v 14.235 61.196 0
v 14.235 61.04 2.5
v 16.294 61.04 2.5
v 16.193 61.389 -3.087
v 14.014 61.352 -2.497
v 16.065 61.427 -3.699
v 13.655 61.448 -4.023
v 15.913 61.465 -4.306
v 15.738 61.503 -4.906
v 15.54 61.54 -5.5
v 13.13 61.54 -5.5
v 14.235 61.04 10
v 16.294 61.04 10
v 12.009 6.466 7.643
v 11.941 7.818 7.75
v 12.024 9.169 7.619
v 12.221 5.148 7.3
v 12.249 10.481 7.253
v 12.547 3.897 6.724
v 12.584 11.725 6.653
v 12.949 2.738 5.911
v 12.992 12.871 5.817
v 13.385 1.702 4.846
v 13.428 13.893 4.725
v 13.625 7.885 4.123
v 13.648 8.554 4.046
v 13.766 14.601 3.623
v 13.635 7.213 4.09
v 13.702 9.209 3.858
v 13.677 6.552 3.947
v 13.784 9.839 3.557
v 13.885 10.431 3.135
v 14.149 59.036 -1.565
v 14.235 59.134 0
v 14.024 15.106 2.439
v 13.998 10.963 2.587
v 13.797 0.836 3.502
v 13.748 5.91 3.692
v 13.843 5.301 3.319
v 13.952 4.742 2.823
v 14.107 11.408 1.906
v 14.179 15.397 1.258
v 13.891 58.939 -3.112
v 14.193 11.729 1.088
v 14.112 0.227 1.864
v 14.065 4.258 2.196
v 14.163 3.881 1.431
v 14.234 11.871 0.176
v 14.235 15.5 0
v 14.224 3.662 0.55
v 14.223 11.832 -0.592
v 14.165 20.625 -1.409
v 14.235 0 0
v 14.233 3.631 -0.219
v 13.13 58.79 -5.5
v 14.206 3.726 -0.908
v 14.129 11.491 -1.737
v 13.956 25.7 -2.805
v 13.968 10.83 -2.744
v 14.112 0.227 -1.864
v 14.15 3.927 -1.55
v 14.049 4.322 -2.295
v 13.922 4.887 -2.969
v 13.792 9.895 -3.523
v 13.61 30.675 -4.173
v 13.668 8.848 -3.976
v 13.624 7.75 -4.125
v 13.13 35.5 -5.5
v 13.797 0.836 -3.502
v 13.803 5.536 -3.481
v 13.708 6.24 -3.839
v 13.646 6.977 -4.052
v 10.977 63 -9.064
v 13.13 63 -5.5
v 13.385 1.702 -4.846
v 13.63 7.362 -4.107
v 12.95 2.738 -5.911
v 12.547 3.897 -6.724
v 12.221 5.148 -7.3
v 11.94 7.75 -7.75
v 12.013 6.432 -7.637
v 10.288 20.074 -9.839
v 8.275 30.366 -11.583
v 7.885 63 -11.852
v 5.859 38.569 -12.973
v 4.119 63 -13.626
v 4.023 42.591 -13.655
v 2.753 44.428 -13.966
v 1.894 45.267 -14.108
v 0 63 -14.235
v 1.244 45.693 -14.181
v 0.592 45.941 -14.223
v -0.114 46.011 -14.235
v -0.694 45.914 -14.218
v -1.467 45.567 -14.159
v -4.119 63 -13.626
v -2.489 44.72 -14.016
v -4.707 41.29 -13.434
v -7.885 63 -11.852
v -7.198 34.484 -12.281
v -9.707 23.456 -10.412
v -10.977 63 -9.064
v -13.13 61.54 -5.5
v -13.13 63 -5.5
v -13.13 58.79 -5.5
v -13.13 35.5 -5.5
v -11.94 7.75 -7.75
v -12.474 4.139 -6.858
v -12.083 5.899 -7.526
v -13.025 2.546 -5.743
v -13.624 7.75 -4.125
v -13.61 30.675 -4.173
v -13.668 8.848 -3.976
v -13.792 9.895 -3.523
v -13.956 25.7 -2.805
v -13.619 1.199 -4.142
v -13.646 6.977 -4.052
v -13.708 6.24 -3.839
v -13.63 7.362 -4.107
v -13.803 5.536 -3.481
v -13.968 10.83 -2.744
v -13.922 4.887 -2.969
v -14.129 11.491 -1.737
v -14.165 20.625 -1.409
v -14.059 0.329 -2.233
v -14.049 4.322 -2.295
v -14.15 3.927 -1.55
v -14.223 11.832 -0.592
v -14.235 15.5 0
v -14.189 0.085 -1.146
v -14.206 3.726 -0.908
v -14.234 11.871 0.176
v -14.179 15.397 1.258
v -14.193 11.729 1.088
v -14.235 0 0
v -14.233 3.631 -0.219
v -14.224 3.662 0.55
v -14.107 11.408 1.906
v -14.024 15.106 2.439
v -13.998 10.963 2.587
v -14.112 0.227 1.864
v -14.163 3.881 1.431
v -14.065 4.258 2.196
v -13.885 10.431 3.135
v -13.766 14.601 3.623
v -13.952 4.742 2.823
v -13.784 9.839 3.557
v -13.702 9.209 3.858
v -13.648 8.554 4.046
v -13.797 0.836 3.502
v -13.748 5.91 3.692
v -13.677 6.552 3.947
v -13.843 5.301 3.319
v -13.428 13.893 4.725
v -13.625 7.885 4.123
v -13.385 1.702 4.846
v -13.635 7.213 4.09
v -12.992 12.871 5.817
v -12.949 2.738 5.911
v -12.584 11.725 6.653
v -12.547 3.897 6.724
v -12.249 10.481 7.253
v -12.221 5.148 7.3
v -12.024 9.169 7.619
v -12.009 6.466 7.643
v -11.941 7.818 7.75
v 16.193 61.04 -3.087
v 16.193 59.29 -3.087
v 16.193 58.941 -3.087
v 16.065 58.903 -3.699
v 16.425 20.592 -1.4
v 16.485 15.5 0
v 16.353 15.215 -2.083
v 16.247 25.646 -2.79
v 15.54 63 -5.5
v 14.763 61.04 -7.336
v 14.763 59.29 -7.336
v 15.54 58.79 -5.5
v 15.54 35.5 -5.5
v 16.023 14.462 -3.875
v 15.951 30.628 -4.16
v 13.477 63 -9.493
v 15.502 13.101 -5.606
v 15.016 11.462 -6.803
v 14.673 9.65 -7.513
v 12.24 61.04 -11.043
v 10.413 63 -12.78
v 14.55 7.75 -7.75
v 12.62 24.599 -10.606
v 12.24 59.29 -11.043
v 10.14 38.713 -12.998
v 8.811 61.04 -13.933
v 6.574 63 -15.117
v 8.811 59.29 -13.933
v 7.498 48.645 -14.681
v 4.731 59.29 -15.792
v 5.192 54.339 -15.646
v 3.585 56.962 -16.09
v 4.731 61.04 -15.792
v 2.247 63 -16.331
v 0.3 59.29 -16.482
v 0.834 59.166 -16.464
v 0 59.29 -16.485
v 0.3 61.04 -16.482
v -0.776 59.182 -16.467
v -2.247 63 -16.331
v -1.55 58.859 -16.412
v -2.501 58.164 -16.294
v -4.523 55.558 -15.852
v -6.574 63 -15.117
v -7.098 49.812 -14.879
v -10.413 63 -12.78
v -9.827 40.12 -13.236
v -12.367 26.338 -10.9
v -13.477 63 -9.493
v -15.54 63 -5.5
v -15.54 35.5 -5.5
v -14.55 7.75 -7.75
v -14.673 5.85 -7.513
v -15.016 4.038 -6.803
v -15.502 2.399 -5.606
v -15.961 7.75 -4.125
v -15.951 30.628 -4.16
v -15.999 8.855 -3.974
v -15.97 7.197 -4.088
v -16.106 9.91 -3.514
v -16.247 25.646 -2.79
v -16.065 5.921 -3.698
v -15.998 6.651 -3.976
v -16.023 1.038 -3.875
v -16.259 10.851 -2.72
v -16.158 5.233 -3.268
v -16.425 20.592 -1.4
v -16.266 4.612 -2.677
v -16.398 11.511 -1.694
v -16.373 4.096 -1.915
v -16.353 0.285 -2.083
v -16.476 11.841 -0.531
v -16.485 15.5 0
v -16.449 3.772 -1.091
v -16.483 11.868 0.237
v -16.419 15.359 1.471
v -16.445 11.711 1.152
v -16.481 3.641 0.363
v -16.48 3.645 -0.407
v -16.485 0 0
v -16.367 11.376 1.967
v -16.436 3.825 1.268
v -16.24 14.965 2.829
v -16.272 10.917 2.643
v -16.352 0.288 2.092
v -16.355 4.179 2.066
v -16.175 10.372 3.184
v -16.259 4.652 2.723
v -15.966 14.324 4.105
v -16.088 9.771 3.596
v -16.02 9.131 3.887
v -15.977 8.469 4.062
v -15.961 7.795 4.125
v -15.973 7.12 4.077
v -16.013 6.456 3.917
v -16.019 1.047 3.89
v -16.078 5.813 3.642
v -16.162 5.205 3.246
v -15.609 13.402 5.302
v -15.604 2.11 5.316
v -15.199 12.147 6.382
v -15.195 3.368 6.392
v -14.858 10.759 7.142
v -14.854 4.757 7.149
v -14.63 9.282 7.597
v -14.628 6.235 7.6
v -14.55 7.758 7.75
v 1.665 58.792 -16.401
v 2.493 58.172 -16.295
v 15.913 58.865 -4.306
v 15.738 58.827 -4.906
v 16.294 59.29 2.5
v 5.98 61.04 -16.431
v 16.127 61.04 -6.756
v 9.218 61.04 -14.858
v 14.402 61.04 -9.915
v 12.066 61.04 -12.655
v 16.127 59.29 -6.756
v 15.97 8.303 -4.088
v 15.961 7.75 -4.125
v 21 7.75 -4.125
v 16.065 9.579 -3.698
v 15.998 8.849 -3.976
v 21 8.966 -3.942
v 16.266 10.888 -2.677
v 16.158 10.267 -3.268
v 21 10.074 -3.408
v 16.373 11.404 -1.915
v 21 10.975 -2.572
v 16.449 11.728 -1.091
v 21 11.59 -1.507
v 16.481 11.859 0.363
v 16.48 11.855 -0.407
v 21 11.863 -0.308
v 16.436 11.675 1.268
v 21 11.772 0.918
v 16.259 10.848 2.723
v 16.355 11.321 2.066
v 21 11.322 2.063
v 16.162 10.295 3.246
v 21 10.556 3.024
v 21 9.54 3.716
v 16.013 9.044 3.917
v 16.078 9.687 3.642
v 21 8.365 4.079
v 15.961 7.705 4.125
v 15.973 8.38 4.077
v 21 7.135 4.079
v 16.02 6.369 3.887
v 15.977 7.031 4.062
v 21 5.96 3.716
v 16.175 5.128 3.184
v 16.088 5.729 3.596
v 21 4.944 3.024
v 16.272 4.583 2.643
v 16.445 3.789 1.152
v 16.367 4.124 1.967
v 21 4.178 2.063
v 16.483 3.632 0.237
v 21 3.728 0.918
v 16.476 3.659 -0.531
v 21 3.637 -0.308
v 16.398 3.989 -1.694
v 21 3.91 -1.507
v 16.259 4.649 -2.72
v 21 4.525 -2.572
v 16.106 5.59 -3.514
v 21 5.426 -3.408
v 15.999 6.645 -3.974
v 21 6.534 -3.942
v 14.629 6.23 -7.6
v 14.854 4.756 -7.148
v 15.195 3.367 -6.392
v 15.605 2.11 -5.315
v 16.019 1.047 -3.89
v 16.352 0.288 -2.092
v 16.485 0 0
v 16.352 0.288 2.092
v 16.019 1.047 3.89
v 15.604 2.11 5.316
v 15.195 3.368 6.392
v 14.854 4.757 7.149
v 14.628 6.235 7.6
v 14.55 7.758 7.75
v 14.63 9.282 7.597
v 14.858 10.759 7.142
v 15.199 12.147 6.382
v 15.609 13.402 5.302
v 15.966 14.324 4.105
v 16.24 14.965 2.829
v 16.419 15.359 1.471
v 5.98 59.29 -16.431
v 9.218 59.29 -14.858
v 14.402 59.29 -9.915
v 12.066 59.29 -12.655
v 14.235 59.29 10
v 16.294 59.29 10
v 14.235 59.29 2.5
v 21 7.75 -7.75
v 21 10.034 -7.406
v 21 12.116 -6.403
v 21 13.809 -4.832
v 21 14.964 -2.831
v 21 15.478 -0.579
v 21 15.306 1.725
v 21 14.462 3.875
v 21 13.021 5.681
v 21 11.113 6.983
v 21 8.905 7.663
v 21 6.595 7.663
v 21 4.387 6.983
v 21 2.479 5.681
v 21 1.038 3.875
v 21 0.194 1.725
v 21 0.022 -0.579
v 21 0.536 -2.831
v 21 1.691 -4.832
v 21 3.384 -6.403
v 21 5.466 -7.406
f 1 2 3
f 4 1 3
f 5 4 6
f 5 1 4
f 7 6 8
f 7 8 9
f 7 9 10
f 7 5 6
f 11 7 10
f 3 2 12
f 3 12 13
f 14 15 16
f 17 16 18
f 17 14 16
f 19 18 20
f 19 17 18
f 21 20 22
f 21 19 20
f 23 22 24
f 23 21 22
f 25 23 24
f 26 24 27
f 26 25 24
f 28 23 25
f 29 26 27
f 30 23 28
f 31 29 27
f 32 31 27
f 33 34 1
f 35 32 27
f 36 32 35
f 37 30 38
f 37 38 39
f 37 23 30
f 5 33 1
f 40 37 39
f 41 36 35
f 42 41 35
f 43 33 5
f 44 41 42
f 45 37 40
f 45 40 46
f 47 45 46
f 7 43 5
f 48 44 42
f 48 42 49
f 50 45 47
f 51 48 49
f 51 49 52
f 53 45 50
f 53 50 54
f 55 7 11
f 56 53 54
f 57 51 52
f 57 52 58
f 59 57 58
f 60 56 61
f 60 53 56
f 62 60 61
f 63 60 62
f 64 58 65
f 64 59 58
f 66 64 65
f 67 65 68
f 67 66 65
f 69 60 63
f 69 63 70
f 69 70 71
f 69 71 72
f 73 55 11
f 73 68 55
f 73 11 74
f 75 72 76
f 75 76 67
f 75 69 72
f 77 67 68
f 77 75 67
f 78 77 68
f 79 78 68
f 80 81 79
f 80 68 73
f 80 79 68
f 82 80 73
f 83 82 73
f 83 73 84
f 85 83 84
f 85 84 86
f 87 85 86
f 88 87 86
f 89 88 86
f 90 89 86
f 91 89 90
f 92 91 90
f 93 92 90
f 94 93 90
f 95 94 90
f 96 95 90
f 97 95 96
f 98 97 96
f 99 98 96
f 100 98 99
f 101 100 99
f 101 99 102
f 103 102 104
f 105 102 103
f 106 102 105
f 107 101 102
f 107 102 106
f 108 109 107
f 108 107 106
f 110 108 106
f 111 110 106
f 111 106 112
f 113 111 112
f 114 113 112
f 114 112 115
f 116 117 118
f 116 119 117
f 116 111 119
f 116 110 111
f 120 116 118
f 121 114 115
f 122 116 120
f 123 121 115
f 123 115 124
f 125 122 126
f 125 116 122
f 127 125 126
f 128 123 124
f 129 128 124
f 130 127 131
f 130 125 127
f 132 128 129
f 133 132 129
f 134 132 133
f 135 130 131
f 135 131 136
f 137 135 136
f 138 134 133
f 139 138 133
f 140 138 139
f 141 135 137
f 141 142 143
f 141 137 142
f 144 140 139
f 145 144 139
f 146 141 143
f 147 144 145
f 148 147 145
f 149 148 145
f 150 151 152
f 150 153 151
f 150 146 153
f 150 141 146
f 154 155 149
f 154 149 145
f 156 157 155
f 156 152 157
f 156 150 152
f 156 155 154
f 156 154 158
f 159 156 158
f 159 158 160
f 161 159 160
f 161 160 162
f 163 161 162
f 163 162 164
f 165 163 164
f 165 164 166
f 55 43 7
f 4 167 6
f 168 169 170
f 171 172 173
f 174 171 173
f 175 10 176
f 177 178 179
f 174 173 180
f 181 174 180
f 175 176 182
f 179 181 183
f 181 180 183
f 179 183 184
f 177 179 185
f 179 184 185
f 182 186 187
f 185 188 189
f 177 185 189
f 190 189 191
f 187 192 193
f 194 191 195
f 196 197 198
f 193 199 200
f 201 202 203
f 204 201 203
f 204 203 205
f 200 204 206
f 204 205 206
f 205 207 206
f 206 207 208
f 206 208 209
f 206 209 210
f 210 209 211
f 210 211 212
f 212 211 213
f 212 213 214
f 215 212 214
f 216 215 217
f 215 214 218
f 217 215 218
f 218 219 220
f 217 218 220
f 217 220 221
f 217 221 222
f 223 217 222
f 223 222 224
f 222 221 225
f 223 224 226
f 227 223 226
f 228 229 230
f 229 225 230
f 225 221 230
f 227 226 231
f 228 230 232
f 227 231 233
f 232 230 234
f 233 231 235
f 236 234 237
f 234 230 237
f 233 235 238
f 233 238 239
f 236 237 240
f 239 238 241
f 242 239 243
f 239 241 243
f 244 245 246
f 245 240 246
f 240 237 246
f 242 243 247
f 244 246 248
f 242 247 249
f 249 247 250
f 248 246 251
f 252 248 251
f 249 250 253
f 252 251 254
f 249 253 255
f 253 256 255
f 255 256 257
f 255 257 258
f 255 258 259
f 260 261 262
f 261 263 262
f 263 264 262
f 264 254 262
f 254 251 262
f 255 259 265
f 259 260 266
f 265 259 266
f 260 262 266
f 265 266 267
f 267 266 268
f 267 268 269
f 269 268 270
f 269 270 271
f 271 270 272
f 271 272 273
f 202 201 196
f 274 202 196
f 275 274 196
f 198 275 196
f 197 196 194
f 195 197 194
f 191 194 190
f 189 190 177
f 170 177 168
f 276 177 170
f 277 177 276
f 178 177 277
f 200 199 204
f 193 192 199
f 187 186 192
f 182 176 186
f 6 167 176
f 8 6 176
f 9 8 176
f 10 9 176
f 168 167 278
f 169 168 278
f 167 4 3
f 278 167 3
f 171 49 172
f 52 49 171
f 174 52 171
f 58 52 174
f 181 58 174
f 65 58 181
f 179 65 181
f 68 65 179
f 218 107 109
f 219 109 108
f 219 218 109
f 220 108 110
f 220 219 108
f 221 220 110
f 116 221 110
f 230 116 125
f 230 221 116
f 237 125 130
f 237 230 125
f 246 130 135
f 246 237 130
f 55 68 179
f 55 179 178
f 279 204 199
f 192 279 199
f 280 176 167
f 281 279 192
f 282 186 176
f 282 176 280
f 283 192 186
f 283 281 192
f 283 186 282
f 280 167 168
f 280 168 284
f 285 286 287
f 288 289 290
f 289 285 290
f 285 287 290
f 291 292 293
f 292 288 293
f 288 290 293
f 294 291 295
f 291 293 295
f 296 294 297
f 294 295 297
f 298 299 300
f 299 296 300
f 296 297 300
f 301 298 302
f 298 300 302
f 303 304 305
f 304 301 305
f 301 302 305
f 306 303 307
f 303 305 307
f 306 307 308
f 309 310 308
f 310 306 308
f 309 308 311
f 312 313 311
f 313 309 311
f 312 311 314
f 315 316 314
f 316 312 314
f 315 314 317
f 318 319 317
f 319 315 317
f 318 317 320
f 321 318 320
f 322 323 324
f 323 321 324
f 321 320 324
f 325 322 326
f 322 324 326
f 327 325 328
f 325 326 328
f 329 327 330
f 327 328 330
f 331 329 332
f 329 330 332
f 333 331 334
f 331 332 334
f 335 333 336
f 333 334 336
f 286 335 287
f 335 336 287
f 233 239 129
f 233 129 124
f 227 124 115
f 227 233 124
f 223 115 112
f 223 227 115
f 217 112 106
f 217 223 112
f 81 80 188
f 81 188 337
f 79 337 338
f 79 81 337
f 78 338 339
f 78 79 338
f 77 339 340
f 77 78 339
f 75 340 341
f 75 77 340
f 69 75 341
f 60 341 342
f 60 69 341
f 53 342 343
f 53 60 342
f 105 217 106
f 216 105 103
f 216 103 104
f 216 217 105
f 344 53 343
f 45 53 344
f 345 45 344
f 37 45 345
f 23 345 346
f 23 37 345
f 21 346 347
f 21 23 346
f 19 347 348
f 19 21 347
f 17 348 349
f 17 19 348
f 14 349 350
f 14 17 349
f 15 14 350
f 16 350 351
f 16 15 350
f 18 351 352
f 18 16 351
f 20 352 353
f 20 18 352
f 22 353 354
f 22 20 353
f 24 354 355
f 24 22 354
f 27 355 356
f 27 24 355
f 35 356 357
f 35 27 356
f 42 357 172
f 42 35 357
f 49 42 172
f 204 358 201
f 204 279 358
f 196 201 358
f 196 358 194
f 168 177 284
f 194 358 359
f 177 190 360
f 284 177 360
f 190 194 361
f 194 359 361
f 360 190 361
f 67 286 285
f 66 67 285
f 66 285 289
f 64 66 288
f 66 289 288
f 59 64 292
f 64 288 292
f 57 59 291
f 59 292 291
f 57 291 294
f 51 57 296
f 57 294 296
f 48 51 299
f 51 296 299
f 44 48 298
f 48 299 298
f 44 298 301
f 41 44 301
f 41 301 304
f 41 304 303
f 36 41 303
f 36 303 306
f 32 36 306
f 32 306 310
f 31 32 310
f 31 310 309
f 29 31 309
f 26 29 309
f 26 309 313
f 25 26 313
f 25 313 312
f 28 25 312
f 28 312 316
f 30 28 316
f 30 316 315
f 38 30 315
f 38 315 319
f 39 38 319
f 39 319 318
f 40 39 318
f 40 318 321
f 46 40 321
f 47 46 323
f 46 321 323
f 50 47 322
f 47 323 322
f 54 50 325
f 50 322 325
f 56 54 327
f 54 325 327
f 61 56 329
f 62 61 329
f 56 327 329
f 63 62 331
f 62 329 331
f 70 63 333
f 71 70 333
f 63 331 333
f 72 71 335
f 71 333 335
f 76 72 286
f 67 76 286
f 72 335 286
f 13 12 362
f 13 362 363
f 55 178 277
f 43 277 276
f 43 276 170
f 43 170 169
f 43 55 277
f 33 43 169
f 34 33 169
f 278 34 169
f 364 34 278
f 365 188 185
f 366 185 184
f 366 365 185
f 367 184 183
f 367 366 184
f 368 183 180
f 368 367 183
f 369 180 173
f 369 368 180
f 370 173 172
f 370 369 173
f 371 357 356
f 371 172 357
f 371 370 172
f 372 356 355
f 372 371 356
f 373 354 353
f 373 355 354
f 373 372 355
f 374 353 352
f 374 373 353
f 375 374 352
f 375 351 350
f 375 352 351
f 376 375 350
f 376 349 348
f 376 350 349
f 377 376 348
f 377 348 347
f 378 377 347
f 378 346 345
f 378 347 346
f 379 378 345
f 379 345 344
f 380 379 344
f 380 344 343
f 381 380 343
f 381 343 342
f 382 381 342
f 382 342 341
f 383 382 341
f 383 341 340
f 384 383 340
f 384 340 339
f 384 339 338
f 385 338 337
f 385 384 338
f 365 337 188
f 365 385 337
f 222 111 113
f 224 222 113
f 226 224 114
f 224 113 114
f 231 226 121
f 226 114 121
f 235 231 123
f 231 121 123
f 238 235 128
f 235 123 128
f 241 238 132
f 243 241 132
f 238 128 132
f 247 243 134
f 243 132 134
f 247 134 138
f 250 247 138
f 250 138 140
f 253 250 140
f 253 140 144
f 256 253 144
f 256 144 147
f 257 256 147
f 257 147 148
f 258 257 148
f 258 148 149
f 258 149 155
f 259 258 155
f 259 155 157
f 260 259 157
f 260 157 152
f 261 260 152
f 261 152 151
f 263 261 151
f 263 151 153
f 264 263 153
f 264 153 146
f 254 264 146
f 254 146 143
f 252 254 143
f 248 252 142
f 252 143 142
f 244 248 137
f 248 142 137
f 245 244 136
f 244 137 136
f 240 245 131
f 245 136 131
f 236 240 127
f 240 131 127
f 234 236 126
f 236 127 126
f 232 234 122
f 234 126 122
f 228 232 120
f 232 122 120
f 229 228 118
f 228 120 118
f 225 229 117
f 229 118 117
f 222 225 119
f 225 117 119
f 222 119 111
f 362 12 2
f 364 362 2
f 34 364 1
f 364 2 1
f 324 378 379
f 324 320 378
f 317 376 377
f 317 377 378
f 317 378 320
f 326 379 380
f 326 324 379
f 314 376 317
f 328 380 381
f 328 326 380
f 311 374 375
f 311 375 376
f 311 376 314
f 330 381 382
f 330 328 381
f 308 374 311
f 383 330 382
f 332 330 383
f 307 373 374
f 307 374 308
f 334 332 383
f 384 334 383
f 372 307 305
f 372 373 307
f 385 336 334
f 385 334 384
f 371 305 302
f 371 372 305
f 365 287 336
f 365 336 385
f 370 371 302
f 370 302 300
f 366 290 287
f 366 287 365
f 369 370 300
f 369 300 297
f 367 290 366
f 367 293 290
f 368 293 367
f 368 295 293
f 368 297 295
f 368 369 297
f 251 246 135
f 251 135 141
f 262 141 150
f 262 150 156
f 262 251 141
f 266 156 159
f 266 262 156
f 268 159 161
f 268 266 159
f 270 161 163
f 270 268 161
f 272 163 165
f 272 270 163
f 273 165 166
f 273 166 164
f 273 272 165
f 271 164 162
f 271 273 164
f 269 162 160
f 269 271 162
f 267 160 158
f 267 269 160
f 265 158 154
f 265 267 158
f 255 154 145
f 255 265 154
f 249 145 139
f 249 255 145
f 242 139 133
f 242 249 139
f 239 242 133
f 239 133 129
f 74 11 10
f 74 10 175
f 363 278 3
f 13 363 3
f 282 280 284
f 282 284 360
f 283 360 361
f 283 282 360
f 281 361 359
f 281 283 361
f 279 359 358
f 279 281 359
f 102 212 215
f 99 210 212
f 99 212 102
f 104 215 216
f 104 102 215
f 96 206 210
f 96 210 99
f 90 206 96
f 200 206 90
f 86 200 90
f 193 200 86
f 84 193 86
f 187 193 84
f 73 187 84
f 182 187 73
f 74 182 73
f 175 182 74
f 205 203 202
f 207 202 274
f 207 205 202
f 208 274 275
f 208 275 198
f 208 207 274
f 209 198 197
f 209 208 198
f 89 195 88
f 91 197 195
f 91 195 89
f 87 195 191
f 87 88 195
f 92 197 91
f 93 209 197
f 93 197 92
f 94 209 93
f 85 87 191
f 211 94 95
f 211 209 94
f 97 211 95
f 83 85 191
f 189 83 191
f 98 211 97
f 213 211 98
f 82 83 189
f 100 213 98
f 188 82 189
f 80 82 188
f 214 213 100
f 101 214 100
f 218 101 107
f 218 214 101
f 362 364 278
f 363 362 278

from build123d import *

# Parameters (mm, degrees)
SKETCH1_R               = 16.485
SKETCH1_R_2             = 14.235
BOSS_EXTRUDE1_DEPTH     = 63
SKETCH2_R               = 4.125
CUT_EXTRUDE1_DEPTH      = 73.991616813
CUT_EXTRUDE2_START      = -32.970000348
CUT_EXTRUDE2_DEPTH      = 32.970000348
CUT_EXTRUDE4_DEPTH      = 68.175222223
CUT_EXTRUDE4_DEPTH_BACK = 15
BOSS_EXTRUDE2_DEPTH     = 0.875
SKETCH9_W               = 2.280579787
SKETCH9_H               = 1.75
BOSS_EXTRUDE4_DEPTH     = 7.5
SKETCH10_W              = 0.221248718
SKETCH10_H              = 10
CUT_EXTRUDE5_DEPTH      = 2.5
BOSS_EXTRUDE5_REACH     = 77.139
SKETCH11_R              = 7.75
SKETCH11_R_2            = 4.125
CUT_EXTRUDE7_DEPTH      = 10


# Read off the part's stored shape, not the designer's step: Cut-Extrude2
with BuildPart() as part:
    # Sketch1 → Boss-Extrude1 (new body)
    with BuildSketch(Plane(origin=(0, 0, 0), x_dir=(1, 0, 0), z_dir=(0, 1, 0))):
        with Locations(Location((0, 0, 0), (0, 0, 270))):
            Circle(SKETCH1_R)
        with Locations(Location((0, 0, 0), (0, 0, 270))):
            Circle(SKETCH1_R_2, mode=Mode.SUBTRACT)
    extrude(amount=BOSS_EXTRUDE1_DEPTH)

    # Sketch2 → Cut-Extrude1 (cut, through all)
    with BuildSketch(Plane(origin=(16.485, 0, 0), x_dir=(0, 0, -1), z_dir=(1, 0, 0))):
        with Locations((0, 7.75)):
            Circle(SKETCH2_R)
    extrude(amount=-CUT_EXTRUDE1_DEPTH, mode=Mode.SUBTRACT)

    # Cut-Extrude2 outline → Cut-Extrude2 (cut)
    with BuildSketch(Plane(origin=(16.485, 0, 0), x_dir=(0, 0, -1), z_dir=(1, 0, 0)).offset(CUT_EXTRUDE2_START)):
        Polygon((5.5, 63), (-16.485, 63), (-16.485, 61.04), (-2.5, 61.04), (5.5, 61.54), align=None)
        with BuildLine():
            Line((-2.5, 59.29), (-16.485, 59.29))
            Line((-16.485, 59.29), (-16.485, 0))
            Line((-16.485, 0), (1.7e-08, 0))
            ThreePointArc((1.7e-08, 0), (-7.75, 7.749999991), (0, 15.5))
            Line((0, 15.5), (5.5, 35.5))
            Line((5.5, 35.5), (5.5, 58.79))
            Line((5.5, 58.79), (-2.5, 59.29))
        make_face()
        with BuildLine():
            ThreePointArc((7.75, 7.75), (5.48007756, 2.269922452), (1.7e-08, 0))
            Line((1.7e-08, 0), (16.485, 0))
            Line((16.485, 0), (16.485, 59.29))
            Line((16.485, 59.29), (7.75, 7.75))
        make_face()
    extrude(amount=CUT_EXTRUDE2_DEPTH, mode=Mode.SUBTRACT)

    # Sketch6 → Cut-Extrude4 (cut, two sides: drawn at the far end of the back side and taken through both)
    with BuildSketch(Plane(origin=(0, 63, 0), x_dir=(1, 0, 0), z_dir=(0, 1, 0)).offset(-CUT_EXTRUDE4_DEPTH_BACK)):
        Polygon((-103.23133718, 5.5), (-15.540438379, 5.5), (-13.1295554, 5.5), (0, 0), (14.013751282, -2.5), (16.294331069, -2.5), (103.985229871, -2.5), (97.219313689, -177.751240534), (-109.997253363, -169.751240534), align=None)
    extrude(amount=CUT_EXTRUDE4_DEPTH + CUT_EXTRUDE4_DEPTH_BACK, mode=Mode.SUBTRACT)

    # Sketch7 → Boss-Extrude2 (add, symmetric)
    with BuildSketch(Plane(origin=(0, 60.165, 0), x_dir=(1, 0, 0), z_dir=(0, 1, 0))):
        with BuildLine():
            ThreePointArc((0.300302569, 16.48226451), (10.624070386, 12.604933694), (16.193433276, 3.086736743))
            Line((16.193433276, 3.086736743), (16.127170788, 6.755707763))
            ThreePointArc((16.127170788, 6.755707763), (12.065849771, 12.654662947), (5.980222206, 16.430525474))
            Line((5.980222206, 16.430525474), (0.300302569, 16.48226451))
        make_face()
    extrude(amount=BOSS_EXTRUDE2_DEPTH, both=True)

    # Sketch9 → Boss-Extrude4 (add)
    with BuildSketch(Plane.XY.offset(2.5)):
        with Locations((15.154041176, 60.165)):
            Rectangle(SKETCH9_W, SKETCH9_H)
    extrude(amount=BOSS_EXTRUDE4_DEPTH)

    # Sketch10 → Cut-Extrude5 (cut, symmetric)
    with BuildSketch(Plane(origin=(0, 61.04, 0), x_dir=(1, 0, 0), z_dir=(0, 1, 0))):
        with Locations((14.124375641, -5)):
            Rectangle(SKETCH10_W, SKETCH10_H)
    extrude(amount=CUT_EXTRUDE5_DEPTH, both=True, mode=Mode.SUBTRACT)

    # Sketch11 → Boss-Extrude5 (add, up to next)
    with BuildSketch(Plane(origin=(21, 0, 0), x_dir=(0, 0, -1), z_dir=(1, 0, 0)), mode=Mode.PRIVATE) as boss_extrude5_sk1:
        with Locations((0, 7.75)):
            Circle(SKETCH11_R)
        with Locations((0, 7.75)):
            Circle(SKETCH11_R_2, mode=Mode.SUBTRACT)
    boss_extrude5_tool1 = extrude(boss_extrude5_sk1.sketch, amount=-BOSS_EXTRUDE5_REACH, mode=Mode.PRIVATE) - part.part
    add(boss_extrude5_tool1.solids().sort_by_distance((21, 7.75, 7.530797))[0])

    # Sketch16 → Cut-Extrude7 (cut)
    with BuildSketch(Plane(origin=(0, 63, 0), x_dir=(1, 0, 0), z_dir=(0, 1, 0))):
        Polygon((16.127170788, 6.755707763), (16.294331069, -2.5), (18.305732321, -2.5), (18.305732321, 6.795053101), align=None)
    extrude(amount=-CUT_EXTRUDE7_DEPTH, mode=Mode.SUBTRACT)


solid = part.part
